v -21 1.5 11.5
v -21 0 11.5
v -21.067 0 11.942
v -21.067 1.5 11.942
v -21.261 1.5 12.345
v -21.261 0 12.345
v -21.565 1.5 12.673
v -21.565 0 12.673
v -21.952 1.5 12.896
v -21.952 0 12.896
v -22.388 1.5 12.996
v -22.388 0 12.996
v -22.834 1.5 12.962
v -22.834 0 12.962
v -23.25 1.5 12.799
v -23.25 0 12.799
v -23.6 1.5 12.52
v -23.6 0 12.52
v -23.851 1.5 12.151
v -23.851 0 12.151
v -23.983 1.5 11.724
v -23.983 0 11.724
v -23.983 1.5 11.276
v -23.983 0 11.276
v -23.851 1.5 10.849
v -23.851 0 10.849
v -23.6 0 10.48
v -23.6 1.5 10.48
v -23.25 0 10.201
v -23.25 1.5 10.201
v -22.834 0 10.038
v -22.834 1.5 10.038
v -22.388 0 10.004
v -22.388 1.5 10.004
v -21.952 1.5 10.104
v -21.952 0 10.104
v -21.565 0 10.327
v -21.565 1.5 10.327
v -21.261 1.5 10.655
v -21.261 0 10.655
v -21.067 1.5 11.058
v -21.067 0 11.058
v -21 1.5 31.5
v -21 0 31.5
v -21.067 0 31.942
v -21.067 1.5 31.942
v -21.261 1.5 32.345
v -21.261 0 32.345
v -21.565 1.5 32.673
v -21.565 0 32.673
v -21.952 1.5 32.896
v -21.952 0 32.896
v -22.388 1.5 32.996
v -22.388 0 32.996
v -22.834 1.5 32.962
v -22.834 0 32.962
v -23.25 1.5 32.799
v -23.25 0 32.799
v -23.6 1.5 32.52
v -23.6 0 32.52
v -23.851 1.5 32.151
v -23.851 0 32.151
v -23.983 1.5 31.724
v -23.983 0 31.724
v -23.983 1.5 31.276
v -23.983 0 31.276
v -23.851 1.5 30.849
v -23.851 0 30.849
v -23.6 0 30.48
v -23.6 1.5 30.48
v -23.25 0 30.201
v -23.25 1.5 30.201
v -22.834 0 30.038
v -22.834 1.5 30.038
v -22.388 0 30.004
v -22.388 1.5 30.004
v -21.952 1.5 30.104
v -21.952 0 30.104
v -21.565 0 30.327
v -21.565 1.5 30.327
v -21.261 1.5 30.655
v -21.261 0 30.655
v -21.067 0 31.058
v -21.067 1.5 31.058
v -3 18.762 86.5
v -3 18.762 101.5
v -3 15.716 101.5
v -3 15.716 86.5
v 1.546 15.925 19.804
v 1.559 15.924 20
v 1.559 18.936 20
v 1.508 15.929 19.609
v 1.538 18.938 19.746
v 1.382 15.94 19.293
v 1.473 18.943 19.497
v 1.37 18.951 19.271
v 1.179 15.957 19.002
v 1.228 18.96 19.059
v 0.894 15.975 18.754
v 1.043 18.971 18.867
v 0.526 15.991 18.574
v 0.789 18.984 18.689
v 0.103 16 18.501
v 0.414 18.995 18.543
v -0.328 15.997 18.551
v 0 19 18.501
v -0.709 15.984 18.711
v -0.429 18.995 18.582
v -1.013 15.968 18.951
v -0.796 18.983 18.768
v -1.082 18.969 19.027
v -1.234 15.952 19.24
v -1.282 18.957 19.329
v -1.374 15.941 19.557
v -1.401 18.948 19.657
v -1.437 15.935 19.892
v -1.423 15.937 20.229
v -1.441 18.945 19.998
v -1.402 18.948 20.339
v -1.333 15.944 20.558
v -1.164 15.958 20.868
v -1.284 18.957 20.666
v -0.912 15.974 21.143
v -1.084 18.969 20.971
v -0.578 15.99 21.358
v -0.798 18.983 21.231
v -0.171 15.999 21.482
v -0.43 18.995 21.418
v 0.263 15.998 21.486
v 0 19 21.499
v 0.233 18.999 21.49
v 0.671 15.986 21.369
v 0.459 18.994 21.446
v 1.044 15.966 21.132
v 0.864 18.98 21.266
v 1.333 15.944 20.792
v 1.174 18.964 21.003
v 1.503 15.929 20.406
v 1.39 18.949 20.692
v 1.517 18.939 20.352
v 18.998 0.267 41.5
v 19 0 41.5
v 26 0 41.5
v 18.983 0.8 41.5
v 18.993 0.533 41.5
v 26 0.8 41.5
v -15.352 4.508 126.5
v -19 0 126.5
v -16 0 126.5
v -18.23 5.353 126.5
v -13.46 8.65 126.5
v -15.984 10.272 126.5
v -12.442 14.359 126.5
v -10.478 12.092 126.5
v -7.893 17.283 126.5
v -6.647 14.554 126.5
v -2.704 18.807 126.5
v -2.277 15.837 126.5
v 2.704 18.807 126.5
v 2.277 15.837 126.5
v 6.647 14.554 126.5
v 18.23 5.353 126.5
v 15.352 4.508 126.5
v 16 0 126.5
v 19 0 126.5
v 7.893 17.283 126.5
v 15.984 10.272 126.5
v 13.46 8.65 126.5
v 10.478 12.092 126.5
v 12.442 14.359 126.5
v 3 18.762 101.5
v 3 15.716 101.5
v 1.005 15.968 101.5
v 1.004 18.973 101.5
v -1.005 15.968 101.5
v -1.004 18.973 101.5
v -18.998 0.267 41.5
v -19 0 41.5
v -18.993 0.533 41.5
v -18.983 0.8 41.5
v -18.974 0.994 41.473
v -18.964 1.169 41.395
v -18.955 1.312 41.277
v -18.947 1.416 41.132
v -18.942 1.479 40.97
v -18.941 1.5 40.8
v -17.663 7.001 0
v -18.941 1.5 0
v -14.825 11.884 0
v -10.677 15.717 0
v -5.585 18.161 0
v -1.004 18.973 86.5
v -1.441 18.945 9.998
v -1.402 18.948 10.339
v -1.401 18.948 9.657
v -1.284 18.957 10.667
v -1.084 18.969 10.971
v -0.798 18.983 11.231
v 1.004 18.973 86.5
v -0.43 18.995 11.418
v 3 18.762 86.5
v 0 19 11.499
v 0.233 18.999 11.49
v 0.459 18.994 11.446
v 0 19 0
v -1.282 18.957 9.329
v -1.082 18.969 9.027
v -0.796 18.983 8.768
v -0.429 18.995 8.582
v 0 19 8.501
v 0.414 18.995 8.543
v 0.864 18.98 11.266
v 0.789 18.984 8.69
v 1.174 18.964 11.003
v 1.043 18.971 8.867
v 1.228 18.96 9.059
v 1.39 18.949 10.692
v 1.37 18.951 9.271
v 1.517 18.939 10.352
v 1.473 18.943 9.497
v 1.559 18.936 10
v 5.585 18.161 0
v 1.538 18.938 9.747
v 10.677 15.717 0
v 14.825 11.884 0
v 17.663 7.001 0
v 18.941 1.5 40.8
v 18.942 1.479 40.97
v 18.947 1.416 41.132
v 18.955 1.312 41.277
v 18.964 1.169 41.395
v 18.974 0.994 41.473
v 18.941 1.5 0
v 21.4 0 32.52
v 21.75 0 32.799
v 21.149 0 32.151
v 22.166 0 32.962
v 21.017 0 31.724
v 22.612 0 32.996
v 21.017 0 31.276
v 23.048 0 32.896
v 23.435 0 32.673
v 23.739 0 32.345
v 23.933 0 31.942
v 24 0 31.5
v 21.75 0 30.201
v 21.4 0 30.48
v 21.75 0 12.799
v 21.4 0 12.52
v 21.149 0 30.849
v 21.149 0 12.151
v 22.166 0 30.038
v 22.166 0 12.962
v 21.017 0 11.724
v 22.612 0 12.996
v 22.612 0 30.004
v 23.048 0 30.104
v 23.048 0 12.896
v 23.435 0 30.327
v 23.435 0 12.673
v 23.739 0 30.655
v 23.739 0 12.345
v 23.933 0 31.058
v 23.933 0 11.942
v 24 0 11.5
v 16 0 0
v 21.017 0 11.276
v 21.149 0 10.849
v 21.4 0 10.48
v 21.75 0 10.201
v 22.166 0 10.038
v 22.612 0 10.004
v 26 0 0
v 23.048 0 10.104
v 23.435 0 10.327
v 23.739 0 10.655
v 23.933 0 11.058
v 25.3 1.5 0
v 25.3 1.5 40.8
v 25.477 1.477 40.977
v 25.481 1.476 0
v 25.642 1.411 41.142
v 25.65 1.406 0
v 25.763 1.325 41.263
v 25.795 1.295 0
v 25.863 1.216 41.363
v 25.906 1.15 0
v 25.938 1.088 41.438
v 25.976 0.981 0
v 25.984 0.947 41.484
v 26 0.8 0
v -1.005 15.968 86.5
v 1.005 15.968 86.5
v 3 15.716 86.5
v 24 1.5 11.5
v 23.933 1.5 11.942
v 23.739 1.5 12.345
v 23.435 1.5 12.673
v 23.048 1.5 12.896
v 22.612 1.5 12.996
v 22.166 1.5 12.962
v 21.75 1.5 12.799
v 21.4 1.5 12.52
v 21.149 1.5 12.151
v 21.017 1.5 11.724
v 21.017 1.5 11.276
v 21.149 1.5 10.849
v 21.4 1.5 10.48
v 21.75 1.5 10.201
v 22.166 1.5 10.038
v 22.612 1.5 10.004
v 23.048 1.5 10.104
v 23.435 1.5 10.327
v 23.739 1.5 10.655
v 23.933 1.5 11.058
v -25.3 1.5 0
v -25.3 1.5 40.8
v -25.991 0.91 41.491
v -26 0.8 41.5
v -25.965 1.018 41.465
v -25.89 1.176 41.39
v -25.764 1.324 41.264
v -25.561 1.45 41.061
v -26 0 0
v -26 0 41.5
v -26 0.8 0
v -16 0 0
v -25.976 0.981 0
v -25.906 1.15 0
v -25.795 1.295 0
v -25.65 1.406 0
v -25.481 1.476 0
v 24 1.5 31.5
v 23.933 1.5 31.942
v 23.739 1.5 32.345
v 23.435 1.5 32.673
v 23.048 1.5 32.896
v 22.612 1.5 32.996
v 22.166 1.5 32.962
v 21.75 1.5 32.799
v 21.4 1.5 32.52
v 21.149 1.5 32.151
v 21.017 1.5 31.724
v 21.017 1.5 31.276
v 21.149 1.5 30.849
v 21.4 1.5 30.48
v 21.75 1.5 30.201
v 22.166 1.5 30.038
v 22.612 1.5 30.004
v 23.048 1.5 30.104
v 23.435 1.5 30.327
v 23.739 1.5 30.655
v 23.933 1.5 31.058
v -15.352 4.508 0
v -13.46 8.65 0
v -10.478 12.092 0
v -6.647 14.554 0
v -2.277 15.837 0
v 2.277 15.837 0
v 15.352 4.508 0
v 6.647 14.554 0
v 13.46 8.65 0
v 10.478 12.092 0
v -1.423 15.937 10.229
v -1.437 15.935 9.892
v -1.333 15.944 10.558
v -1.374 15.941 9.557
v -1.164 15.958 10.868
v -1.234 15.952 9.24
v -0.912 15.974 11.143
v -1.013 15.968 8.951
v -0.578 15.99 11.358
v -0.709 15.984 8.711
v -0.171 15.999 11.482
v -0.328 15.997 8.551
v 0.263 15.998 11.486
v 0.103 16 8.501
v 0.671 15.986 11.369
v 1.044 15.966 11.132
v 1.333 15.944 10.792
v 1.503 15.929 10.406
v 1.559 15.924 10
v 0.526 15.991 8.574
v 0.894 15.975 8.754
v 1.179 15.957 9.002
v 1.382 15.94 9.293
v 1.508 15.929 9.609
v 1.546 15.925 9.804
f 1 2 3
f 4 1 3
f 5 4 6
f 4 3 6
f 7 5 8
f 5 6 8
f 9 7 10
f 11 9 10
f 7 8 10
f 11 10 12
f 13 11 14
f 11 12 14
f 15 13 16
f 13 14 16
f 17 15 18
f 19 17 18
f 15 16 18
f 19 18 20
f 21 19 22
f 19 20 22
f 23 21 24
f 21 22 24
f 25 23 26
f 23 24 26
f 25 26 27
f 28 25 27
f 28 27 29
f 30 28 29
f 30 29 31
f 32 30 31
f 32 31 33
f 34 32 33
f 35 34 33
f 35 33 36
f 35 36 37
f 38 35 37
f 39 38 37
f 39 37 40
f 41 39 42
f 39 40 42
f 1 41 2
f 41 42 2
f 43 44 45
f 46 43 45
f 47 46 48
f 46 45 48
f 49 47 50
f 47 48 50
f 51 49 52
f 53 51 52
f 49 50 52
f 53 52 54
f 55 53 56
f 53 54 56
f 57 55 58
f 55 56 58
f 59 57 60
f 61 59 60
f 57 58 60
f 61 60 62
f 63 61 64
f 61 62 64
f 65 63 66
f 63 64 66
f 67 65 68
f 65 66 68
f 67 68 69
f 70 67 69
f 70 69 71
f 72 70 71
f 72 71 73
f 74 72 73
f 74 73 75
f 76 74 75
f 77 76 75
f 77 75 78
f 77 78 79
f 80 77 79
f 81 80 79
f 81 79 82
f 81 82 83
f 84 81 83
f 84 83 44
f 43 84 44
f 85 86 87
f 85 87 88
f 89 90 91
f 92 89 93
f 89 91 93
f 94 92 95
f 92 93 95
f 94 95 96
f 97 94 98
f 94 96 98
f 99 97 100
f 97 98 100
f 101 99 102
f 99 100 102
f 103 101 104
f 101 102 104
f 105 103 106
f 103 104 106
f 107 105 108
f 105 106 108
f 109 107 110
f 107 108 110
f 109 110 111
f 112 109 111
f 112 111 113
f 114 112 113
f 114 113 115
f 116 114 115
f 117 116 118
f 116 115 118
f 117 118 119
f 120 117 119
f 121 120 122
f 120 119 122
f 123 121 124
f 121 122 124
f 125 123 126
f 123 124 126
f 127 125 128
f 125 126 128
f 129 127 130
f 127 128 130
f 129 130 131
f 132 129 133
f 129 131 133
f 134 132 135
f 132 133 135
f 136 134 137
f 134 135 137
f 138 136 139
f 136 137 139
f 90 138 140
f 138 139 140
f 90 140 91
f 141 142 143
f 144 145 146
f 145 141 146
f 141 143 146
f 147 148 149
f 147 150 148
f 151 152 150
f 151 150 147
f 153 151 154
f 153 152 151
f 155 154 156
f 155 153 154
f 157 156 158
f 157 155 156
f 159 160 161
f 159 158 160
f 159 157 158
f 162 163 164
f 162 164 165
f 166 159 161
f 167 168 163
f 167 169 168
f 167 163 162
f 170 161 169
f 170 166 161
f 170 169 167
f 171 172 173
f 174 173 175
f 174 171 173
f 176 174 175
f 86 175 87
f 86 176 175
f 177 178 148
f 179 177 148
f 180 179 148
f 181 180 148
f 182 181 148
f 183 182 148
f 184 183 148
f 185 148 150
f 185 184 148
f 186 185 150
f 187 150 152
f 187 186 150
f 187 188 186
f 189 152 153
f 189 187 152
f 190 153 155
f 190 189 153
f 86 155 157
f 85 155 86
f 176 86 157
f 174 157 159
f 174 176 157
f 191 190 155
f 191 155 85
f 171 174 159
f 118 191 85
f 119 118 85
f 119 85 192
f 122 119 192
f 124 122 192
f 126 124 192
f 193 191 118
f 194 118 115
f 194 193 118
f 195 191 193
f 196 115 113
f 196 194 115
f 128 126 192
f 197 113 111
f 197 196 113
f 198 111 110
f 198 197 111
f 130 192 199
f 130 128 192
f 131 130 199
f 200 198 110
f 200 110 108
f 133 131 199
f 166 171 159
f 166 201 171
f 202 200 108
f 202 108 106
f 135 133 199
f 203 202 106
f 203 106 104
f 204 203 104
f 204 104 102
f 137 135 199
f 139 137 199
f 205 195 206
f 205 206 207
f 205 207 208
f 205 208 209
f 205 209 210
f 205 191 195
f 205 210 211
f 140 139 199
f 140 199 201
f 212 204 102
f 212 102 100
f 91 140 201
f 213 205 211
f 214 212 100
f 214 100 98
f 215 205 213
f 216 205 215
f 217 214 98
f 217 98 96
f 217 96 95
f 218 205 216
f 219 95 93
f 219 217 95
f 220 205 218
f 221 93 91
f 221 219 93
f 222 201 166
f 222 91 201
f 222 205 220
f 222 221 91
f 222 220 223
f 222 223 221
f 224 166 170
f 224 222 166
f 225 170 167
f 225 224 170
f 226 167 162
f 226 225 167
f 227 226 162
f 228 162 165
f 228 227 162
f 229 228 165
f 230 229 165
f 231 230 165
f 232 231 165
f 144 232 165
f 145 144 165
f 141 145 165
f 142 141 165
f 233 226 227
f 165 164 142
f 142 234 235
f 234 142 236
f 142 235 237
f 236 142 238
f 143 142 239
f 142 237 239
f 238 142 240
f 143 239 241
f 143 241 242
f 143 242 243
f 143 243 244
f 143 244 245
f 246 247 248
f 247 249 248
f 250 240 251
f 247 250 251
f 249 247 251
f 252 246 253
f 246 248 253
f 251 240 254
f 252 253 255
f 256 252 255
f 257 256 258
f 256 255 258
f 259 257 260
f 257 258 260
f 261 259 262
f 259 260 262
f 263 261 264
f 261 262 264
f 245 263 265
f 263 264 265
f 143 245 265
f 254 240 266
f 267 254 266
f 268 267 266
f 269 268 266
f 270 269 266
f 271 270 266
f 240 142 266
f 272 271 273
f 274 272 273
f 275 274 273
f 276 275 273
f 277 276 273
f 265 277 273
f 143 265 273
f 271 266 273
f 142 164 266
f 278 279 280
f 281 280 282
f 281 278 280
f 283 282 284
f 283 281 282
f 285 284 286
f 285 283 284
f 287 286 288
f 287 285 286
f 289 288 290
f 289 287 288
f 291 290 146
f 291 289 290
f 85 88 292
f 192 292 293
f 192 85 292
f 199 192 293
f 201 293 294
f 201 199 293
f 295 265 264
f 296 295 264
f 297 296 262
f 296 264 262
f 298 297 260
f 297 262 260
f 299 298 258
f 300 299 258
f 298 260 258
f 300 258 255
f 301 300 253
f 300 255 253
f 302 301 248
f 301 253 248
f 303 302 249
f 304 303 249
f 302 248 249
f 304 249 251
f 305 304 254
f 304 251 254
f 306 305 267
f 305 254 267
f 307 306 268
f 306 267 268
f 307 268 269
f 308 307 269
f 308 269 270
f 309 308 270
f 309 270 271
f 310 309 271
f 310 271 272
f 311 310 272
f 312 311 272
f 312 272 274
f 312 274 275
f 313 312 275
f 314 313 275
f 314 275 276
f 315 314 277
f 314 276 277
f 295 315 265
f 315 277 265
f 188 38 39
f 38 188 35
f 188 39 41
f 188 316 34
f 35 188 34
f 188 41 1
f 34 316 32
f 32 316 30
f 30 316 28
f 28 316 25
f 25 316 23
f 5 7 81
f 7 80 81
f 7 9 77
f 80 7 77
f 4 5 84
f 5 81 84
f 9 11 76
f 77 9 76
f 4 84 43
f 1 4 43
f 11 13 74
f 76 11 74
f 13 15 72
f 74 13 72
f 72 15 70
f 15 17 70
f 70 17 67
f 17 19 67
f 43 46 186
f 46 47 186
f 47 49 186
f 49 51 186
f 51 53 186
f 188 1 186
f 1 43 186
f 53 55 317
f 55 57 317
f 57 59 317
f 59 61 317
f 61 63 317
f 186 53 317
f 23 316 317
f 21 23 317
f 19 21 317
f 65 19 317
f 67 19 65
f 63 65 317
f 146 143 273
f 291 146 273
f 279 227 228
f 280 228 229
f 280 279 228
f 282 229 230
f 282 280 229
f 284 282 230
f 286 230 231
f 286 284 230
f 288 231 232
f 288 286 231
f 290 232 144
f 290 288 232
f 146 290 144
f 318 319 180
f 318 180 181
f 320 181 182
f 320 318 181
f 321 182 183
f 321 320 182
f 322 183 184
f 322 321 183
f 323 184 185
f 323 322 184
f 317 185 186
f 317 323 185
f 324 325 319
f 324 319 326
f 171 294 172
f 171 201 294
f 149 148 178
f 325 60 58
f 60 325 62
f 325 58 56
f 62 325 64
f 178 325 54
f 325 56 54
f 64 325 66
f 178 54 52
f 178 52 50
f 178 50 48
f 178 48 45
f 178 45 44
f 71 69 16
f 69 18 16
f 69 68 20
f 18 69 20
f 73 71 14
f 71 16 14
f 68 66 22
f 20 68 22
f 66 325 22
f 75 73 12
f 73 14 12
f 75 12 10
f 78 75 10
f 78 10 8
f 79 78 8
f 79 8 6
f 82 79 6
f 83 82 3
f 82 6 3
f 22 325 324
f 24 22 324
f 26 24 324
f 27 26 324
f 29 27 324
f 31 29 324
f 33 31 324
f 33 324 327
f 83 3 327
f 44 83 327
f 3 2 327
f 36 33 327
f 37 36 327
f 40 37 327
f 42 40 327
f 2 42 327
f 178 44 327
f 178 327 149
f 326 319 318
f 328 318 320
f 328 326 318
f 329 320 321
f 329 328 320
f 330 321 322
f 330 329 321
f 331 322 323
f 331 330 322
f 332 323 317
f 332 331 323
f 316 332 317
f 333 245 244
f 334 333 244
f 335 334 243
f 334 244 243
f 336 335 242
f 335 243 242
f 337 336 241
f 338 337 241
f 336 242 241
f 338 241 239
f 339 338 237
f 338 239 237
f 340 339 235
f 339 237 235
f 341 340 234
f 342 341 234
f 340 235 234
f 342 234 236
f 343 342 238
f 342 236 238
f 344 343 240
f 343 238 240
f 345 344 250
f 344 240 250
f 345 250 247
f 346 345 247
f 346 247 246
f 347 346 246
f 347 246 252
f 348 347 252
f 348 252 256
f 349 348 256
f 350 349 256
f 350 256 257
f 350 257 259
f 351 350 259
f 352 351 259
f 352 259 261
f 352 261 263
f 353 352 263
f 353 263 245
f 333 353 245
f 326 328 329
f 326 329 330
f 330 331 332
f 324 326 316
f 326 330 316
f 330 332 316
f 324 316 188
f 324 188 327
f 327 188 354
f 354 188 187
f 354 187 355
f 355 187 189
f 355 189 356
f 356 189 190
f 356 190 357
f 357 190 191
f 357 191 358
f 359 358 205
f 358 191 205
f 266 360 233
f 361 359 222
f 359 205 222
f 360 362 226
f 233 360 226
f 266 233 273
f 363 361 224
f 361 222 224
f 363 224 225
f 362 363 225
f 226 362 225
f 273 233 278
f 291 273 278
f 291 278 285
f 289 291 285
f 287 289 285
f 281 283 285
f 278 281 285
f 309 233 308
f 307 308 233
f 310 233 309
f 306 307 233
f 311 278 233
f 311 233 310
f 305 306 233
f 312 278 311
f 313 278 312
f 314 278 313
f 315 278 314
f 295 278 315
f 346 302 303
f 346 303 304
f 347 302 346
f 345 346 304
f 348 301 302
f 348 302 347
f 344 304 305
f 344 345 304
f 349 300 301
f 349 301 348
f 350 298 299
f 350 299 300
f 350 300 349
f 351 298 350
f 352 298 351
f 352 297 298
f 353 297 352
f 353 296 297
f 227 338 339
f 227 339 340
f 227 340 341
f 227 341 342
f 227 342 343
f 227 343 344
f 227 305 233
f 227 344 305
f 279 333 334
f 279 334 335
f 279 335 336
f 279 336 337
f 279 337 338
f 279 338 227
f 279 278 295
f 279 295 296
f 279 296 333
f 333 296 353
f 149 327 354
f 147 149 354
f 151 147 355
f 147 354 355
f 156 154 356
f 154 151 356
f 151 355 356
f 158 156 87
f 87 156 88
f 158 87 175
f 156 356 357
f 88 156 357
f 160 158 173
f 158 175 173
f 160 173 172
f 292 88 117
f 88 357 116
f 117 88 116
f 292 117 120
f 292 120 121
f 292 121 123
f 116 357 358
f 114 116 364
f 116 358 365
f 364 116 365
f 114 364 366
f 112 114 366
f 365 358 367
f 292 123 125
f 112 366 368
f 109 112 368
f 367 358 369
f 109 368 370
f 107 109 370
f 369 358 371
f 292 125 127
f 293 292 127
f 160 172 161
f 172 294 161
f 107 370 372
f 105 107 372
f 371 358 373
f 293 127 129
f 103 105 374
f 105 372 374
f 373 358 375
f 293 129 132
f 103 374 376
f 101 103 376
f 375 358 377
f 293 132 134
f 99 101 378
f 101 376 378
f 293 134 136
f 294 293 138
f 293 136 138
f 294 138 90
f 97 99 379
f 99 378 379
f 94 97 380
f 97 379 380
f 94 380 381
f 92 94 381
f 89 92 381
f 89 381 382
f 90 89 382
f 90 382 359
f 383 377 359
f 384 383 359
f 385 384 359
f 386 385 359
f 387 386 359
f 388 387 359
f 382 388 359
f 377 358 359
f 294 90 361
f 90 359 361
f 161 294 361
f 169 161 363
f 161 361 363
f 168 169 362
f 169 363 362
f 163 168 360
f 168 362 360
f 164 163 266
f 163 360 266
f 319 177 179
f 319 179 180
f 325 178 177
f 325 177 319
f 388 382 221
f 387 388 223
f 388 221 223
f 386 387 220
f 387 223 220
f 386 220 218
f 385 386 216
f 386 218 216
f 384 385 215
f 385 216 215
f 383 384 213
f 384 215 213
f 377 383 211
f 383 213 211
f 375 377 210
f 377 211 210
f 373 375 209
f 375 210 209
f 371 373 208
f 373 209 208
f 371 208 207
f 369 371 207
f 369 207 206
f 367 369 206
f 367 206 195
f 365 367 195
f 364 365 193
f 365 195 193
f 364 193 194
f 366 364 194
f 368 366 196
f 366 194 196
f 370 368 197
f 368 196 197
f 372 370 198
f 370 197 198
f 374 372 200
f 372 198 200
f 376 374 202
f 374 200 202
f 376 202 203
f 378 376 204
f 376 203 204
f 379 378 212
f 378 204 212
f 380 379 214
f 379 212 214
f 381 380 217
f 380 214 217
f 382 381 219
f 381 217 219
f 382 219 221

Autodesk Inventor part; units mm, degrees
ref_plane "YZ Plane" through (0, 0, 0) normal (1, 0, 0) x (0, 1, 0)
ref_plane "XZ Plane" through (0, 0, 0) normal (0, 1, 0) x (-1, 0, 0)
ref_plane "XY Plane" through (0, 0, 0) normal (0, 0, 1) x (1, 0, 0)
sketch "roof_sketch" plane through (0, 0, 0) normal (0, 0, 1) x (1, 0, 0)
  line L0 (-26.6, 0) -> (26.6, 0) construction
  line L1 (0, -3.8) -> (0, 22.8) construction
  line L2 (-16, 0) -> (16, 0)
  line L3 (-19, 0) -> (-16, 0)
  line L4 (16, 0) -> (19, 0)
  arc A0 (16, 0) -> (-16, 0) centre (0, 0) ccw
  arc A1 (19, 0) -> (-19, 0) centre (0, 0) ccw
  line L5 (-19, 0) -> (-16, 0)
  line L6 (16, 0) -> (19, 0)
  dimension "d1" = 32
  dimension "d5" = 0
  dimension "d6" = 3
extrude "roof" add sketch "roof_sketch" along normal blind 126.5 contours L3 A1 L4 A0
sketch "bolt_sketch" plane through (16, 0, 0) normal (0, -1, 0) x (1, 0, 0)
  line L0 (-52.4, 0) -> (20.4, 0) construction
  line L1 (-16, -25.3) -> (-16, 151.8) construction
  line L2 (3, 0) -> (3, 126.5) projected
  line L3 (3, 41.5) -> (10, 41.5)
  line L4 (10, 41.5) -> (10, 0)
  line L5 (10, 0) -> (3, 0)
  line L6 (3, 0) -> (3, 41.5)
  circle A0 centre (6.5, 31.5) radius 1.5
  circle A1 centre (6.5, 11.5) radius 1.5
  line L7 (-35, 41.5) -> (-42, 41.5)
  line L8 (-42, 41.5) -> (-42, 0)
  line L9 (-42, 0) -> (-35, 0)
  line L10 (-35, 0) -> (-35, 41.5)
  circle A2 centre (-38.5, 31.5) radius 1.5
  circle A3 centre (-38.5, 11.5) radius 1.5
  point P0 (-16, 0)
  dimension "d9" = 41.5
  dimension "d10" = 3
  dimension "d11" = 3
  dimension "d12" = 10
  dimension "d13" = 20
  dimension "d14" = 7
  dimension "d16" = 3.5
  dimension "d17" = 3.5
extrude "bolt_opposite" add sketch "bolt_sketch" against normal blind 1.5
sketch "error1_" plane through (-19, 0, 0) normal (1, 0, 0) x (0, 0, -1)
  line L0 (0, 1.5) -> (-41.5, 1.5) projected
  line L1 (0, 0) -> (0, 1.5) projected
  line L2 (-41.5, 0) -> (0, 0) projected
  line L3 (-41.5, 0) -> (-41.5, 1.5) projected
extrude "error1" add sketch "error1_" along normal blind 1.5
sketch "error2_" plane through (19, 0, 0) normal (-1, 0, 0) x (0, 0, 1)
  line L0 (0, 0) -> (0, 1.5) projected
  line L1 (0, 1.5) -> (41.5, 1.5) projected
  line L2 (41.5, 0) -> (0, 0) projected
  line L3 (41.5, 0) -> (41.5, 1.5) projected
extrude "error2" add sketch "error2_" along normal blind 1.5
ref_plane "for_button" through (16, 19, 126.5) normal (0, -1, 0) x (1, 0, 0)
sketch "button_sketch" plane through (16, 19, 126.5) normal (0, -1, 0) x (1, 0, 0)
  line L0 (-13, -25) -> (-19, -25)
  line L1 (-19, -25) -> (-19, -40)
  line L2 (-19, -40) -> (-13, -40)
  line L3 (-13, -40) -> (-13, -25)
  line L4 (-35, -85) -> (-35, 0) projected
  line L5 (3, 0) -> (-35, 0) projected
  circle A0 centre (-15.9407, -106.5001) radius 1.5
  circle A1 centre (-15.9407, -116.5) radius 1.5
  line L6 (2.9407, -126.5) -> (-34.9407, -126.5) projected
  line L7 (-34.9407, -126.5) -> (-34.9407, -85) projected
  point P0 (-16, -126.5)
  dimension "d25" = 6
  dimension "d26" = 15
  dimension "d27" = 16
  dimension "d28" = 25
  dimension "d43" = 3
  dimension "d44" = 3
  dimension "d45" = 10
  dimension "d46" = 20
  dimension "d47" = 19
  dimension "d48" = 19
extrude "button" cut sketch "button_sketch" along normal blind 10 contours L3 L2 L1 L0
fillet "so_hurt" radius 0.7 4 edges at (26, 1.5, 20.75) (22.4703, 1.5, 41.5) (-26, 1.5, 20.75) (-22.4703, 1.5, 41.5)
extrude "bar" cut sketch "button_sketch" along normal blind 10 contours A0 | A1
equation "\"d11\" = d10"
equation "\"d16\" = 0.5 * d14"
equation "\"d17\" = d16"
equation "\"d44\" = d43"
equation "\"d48\" = d47"
properties part number "smart_pen4"
